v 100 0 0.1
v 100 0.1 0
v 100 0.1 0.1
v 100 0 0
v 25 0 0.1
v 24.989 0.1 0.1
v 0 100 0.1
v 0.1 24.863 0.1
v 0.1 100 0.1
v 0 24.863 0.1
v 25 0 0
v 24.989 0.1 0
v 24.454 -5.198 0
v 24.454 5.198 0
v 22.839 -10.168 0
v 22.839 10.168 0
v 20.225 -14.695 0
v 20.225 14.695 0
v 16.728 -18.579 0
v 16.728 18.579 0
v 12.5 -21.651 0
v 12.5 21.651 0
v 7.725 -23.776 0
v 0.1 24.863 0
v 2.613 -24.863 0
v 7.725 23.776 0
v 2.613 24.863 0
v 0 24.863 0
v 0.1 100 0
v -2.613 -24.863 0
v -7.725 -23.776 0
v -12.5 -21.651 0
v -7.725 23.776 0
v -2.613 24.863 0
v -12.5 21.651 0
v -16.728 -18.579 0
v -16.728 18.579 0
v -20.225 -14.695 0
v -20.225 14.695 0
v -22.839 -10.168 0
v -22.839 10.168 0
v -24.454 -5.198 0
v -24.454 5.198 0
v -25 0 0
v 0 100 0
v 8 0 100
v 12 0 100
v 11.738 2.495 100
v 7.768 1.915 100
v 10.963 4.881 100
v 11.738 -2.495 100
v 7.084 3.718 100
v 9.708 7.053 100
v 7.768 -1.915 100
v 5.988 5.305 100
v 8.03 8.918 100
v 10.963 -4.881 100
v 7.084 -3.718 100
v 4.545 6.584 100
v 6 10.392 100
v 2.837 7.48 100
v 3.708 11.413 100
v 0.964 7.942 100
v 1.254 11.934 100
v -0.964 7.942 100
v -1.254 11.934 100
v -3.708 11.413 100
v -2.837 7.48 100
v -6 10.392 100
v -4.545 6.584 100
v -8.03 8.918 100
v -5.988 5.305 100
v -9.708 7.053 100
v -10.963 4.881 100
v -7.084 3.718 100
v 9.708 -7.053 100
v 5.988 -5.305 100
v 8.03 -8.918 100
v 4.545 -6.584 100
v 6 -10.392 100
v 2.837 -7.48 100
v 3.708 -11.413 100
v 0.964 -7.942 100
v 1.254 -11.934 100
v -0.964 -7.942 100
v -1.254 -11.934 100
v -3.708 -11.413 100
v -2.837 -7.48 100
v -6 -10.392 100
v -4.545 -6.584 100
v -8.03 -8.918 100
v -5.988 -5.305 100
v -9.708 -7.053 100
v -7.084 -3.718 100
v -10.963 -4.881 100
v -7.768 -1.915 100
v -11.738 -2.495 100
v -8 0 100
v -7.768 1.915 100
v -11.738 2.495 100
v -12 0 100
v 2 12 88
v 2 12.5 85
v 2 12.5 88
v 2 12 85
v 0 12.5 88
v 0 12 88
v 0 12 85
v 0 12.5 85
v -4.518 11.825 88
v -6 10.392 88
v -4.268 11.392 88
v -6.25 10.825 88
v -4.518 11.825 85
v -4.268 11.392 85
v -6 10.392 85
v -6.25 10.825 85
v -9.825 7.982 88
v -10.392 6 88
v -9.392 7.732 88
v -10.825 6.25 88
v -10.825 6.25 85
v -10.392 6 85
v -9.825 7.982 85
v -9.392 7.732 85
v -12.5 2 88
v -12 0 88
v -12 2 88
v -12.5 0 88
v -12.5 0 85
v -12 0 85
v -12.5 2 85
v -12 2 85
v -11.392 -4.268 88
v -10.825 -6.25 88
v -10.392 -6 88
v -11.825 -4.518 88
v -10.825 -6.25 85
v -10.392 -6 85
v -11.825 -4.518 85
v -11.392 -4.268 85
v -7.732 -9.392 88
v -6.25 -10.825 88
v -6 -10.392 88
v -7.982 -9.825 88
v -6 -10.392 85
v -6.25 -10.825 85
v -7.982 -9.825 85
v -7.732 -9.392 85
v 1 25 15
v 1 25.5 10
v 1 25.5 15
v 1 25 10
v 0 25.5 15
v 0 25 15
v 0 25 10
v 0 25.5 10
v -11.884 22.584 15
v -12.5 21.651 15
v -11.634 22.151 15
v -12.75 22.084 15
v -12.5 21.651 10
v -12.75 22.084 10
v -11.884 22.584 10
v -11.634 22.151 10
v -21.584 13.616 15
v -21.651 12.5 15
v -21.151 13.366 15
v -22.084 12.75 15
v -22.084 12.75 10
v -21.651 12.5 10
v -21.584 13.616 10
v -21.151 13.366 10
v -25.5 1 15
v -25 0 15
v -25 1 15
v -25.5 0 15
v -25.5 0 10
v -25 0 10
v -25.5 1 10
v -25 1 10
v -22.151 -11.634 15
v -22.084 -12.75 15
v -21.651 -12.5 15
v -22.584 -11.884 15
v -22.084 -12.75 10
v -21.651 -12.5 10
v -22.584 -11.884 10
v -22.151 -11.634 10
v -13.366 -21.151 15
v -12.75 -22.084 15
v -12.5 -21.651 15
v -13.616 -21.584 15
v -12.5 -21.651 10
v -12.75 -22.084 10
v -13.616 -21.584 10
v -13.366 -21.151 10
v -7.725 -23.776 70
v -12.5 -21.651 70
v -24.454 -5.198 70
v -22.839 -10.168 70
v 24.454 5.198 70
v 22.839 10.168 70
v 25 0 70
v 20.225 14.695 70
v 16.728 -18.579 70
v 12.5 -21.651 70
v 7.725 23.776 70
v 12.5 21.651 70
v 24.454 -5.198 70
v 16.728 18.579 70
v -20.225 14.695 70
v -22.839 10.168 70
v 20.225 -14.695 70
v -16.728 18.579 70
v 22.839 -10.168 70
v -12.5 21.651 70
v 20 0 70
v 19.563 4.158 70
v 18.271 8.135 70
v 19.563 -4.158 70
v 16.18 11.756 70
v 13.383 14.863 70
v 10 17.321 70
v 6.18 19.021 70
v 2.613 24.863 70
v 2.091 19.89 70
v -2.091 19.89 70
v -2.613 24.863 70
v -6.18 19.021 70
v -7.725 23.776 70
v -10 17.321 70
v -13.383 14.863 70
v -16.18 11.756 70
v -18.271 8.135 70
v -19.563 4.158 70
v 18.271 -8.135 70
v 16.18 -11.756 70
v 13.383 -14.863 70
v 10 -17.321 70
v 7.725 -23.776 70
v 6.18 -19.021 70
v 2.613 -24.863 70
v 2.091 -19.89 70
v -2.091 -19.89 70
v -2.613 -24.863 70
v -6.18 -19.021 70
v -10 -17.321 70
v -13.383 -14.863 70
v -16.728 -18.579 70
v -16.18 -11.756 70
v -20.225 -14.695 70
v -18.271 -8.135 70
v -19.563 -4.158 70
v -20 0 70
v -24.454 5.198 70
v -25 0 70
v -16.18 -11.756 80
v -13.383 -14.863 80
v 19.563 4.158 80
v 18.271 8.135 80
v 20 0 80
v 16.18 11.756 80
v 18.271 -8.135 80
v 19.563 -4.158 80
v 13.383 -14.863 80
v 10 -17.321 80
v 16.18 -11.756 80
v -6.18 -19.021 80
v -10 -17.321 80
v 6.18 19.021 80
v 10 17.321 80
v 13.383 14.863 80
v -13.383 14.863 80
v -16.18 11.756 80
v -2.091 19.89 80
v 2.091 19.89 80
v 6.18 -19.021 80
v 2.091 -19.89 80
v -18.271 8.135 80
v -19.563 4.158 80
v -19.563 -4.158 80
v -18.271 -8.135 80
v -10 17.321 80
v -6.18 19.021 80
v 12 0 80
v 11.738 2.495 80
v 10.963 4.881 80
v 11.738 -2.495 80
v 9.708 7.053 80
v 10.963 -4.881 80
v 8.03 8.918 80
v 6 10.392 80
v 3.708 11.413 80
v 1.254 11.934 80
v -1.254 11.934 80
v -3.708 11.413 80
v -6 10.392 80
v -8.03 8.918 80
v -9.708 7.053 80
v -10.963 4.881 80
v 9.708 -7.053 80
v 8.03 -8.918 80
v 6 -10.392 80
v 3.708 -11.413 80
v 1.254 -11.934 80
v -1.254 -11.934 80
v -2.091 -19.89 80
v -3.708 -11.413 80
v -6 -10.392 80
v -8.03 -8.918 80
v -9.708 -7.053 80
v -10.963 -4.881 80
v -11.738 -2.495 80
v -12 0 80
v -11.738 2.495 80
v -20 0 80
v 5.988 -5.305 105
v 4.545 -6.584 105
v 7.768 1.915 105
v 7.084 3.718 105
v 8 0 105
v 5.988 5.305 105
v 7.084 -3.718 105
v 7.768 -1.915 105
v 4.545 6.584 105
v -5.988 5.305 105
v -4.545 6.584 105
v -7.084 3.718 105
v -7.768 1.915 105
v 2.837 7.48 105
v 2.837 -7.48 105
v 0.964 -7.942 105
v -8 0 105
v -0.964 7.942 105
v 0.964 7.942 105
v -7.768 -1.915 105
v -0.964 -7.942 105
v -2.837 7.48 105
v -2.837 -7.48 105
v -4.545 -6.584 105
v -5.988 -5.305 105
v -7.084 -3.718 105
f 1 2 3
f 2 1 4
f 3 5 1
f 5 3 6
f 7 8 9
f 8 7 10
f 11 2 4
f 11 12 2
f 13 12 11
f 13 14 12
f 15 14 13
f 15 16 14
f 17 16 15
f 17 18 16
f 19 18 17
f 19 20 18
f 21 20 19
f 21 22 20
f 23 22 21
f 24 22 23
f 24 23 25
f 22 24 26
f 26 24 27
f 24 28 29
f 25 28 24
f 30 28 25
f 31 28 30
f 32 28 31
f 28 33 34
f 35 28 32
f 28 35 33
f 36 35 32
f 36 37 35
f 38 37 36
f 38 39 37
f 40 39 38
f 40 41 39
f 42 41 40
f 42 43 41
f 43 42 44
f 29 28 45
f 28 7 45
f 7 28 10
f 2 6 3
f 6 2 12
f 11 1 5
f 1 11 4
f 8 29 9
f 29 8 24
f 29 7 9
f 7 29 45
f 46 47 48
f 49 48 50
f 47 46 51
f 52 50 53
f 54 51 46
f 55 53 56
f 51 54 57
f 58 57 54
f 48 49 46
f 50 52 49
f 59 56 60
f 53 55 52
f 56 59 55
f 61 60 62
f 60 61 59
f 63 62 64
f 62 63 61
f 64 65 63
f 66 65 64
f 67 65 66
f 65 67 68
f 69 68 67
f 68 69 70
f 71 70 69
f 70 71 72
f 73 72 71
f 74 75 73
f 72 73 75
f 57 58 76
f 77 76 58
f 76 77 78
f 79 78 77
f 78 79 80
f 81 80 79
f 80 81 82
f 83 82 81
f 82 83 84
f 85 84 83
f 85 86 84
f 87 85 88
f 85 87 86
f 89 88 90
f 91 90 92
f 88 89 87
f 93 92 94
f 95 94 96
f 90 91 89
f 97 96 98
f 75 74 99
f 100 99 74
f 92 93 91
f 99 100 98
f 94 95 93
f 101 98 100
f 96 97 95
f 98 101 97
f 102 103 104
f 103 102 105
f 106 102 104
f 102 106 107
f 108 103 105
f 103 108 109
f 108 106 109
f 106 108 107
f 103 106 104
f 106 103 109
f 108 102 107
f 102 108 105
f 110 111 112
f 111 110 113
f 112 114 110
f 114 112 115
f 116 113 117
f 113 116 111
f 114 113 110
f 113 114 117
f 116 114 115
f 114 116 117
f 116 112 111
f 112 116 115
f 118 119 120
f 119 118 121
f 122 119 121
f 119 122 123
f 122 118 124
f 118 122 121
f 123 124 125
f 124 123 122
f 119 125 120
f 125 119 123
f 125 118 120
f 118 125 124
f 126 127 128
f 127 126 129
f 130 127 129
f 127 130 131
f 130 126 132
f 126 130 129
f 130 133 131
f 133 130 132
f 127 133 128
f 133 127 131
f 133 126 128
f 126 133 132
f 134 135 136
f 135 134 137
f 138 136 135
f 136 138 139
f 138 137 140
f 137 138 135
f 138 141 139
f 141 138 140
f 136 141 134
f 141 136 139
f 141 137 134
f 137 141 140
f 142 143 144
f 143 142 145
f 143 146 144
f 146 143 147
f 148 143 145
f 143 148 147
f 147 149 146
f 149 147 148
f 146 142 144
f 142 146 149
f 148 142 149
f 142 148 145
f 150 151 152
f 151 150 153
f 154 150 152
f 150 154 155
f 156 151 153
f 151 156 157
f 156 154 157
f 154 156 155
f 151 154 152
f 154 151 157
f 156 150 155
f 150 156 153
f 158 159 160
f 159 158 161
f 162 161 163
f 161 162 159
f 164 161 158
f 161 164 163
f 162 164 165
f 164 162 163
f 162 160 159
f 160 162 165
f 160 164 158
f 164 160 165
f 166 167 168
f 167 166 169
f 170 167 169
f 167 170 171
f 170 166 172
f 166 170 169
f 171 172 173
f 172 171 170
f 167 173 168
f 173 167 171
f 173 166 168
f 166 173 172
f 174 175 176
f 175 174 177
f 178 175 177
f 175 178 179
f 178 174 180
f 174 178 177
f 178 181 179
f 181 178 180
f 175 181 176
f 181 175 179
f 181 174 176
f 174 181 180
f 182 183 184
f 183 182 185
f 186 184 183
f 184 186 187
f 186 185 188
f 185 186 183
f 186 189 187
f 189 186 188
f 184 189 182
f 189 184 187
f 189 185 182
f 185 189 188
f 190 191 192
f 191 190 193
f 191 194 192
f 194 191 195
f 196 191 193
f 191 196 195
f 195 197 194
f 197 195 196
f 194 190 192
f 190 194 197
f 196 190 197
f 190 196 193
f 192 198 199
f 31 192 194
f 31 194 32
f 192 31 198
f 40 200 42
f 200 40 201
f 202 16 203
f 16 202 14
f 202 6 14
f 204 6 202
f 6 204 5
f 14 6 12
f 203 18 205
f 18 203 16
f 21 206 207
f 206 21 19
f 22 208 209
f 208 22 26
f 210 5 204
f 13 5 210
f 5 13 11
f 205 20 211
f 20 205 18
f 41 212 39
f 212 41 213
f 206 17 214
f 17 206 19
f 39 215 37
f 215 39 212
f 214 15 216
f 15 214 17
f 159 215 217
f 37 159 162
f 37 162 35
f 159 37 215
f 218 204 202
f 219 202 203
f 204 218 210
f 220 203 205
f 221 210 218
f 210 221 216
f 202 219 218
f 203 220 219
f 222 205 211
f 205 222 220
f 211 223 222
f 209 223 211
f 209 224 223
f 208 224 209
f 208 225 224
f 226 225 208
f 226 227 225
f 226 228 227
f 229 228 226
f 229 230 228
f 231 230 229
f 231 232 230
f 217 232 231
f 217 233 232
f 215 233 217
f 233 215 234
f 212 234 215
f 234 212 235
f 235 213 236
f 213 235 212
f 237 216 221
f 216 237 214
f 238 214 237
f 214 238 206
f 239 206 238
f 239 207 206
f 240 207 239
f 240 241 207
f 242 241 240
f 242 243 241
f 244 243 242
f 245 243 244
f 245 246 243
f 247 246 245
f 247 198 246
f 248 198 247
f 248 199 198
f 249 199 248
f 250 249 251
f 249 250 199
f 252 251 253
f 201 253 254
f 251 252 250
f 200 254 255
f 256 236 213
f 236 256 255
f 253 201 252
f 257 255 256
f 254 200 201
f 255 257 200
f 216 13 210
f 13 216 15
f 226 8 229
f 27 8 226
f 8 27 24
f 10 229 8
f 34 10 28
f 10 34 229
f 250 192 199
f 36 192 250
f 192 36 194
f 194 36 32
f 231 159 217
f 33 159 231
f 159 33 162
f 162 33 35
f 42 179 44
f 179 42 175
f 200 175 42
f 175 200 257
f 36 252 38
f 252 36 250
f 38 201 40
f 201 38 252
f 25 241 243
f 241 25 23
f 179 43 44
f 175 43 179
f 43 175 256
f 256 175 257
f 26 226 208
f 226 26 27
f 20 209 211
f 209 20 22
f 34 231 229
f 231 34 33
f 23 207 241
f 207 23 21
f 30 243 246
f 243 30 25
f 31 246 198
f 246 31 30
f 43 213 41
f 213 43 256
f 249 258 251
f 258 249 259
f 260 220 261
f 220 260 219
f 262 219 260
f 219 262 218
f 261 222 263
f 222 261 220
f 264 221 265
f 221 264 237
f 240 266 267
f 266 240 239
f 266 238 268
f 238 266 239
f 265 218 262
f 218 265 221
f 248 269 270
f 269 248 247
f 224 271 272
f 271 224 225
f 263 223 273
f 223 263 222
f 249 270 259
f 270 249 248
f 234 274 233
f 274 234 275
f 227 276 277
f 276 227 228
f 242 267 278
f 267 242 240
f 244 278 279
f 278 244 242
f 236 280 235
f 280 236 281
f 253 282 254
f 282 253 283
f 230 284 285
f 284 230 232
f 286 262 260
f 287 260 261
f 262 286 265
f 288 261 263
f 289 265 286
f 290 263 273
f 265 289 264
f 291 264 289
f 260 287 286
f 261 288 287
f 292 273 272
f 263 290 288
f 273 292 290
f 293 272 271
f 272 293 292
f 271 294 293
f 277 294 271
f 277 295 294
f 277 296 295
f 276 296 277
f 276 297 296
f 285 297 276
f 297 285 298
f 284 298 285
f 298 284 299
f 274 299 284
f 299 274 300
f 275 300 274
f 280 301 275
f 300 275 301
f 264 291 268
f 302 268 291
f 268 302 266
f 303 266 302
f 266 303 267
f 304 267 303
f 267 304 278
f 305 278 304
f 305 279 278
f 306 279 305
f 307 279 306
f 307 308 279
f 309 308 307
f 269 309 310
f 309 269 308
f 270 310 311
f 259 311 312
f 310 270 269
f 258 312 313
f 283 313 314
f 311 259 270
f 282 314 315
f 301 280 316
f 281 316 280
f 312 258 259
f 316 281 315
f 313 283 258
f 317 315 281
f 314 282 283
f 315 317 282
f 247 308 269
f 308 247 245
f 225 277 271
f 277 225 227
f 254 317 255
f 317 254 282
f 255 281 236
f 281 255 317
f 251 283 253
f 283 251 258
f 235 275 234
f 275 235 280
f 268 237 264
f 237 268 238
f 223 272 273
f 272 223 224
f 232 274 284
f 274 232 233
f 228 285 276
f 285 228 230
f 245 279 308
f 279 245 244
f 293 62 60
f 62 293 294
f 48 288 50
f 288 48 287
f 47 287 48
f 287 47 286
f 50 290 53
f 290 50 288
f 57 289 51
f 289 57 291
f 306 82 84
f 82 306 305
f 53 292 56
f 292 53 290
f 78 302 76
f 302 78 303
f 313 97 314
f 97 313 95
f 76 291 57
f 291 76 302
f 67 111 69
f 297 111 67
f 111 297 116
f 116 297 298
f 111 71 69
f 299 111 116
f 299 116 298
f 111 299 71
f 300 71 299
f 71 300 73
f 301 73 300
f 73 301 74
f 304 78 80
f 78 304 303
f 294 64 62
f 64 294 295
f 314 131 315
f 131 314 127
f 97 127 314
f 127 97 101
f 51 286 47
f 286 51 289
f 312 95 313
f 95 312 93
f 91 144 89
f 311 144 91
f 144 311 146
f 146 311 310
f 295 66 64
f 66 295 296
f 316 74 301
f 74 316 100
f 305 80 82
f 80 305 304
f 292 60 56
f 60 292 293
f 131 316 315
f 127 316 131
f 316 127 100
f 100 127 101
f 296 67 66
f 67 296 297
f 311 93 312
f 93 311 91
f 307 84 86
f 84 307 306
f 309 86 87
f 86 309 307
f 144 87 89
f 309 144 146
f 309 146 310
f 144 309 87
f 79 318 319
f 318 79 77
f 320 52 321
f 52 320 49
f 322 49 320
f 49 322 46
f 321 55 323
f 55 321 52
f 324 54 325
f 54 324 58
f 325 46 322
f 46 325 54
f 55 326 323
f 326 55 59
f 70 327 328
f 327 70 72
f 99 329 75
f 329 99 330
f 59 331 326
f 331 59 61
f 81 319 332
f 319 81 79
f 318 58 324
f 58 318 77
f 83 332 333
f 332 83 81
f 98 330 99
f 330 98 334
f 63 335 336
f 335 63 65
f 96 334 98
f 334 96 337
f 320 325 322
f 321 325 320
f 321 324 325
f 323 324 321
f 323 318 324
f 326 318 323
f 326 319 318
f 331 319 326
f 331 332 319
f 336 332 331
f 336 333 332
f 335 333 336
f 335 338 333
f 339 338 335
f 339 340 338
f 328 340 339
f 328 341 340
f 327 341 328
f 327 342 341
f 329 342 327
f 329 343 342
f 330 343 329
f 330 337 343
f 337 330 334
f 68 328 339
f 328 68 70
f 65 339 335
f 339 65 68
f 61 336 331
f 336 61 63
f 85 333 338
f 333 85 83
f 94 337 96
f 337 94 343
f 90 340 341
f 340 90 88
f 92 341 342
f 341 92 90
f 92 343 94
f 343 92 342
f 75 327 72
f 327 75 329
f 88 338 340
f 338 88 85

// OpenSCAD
    // Combined Scene

    // Permanent Model
    
    // Permanent Model (Black)
    color([0, 0, 0]) {
        // Your permanent model code here
        cube([100,0.1,0.1], center = false);
        cube([0.1,100,0.1], center = false);
        cube([0.1,0.1,100], center = false);
    }
    

    // Dynamic Model
    cylinder(h = 70, r = 25); // Main body
translate([0, 0, 70]) {
    cylinder(h = 10, r = 20); // Shoulder
}
translate([0, 0, 80]) {
    cylinder(h = 20, r = 12); // Neck
}
translate([0, 0, 100]) {
    cylinder(h = 5, r = 8); // Cap
}
translate([0, 0, 85]) {
    for (i = [0 : 5]) {
        rotate(i * 30) {
            translate([0, 12, 0]) {
                cube([2, 0.5, 3]); // Grooves on neck
            }
        }
    }
}
translate([0, 0, 10]) {
    for (i = [0 : 5]) {
        rotate(i * 30) {
            translate([0, 25, 0]) {
                cube([1, 0.5, 5]); // Texture or branding on body
            }
        }
    }
}
    
